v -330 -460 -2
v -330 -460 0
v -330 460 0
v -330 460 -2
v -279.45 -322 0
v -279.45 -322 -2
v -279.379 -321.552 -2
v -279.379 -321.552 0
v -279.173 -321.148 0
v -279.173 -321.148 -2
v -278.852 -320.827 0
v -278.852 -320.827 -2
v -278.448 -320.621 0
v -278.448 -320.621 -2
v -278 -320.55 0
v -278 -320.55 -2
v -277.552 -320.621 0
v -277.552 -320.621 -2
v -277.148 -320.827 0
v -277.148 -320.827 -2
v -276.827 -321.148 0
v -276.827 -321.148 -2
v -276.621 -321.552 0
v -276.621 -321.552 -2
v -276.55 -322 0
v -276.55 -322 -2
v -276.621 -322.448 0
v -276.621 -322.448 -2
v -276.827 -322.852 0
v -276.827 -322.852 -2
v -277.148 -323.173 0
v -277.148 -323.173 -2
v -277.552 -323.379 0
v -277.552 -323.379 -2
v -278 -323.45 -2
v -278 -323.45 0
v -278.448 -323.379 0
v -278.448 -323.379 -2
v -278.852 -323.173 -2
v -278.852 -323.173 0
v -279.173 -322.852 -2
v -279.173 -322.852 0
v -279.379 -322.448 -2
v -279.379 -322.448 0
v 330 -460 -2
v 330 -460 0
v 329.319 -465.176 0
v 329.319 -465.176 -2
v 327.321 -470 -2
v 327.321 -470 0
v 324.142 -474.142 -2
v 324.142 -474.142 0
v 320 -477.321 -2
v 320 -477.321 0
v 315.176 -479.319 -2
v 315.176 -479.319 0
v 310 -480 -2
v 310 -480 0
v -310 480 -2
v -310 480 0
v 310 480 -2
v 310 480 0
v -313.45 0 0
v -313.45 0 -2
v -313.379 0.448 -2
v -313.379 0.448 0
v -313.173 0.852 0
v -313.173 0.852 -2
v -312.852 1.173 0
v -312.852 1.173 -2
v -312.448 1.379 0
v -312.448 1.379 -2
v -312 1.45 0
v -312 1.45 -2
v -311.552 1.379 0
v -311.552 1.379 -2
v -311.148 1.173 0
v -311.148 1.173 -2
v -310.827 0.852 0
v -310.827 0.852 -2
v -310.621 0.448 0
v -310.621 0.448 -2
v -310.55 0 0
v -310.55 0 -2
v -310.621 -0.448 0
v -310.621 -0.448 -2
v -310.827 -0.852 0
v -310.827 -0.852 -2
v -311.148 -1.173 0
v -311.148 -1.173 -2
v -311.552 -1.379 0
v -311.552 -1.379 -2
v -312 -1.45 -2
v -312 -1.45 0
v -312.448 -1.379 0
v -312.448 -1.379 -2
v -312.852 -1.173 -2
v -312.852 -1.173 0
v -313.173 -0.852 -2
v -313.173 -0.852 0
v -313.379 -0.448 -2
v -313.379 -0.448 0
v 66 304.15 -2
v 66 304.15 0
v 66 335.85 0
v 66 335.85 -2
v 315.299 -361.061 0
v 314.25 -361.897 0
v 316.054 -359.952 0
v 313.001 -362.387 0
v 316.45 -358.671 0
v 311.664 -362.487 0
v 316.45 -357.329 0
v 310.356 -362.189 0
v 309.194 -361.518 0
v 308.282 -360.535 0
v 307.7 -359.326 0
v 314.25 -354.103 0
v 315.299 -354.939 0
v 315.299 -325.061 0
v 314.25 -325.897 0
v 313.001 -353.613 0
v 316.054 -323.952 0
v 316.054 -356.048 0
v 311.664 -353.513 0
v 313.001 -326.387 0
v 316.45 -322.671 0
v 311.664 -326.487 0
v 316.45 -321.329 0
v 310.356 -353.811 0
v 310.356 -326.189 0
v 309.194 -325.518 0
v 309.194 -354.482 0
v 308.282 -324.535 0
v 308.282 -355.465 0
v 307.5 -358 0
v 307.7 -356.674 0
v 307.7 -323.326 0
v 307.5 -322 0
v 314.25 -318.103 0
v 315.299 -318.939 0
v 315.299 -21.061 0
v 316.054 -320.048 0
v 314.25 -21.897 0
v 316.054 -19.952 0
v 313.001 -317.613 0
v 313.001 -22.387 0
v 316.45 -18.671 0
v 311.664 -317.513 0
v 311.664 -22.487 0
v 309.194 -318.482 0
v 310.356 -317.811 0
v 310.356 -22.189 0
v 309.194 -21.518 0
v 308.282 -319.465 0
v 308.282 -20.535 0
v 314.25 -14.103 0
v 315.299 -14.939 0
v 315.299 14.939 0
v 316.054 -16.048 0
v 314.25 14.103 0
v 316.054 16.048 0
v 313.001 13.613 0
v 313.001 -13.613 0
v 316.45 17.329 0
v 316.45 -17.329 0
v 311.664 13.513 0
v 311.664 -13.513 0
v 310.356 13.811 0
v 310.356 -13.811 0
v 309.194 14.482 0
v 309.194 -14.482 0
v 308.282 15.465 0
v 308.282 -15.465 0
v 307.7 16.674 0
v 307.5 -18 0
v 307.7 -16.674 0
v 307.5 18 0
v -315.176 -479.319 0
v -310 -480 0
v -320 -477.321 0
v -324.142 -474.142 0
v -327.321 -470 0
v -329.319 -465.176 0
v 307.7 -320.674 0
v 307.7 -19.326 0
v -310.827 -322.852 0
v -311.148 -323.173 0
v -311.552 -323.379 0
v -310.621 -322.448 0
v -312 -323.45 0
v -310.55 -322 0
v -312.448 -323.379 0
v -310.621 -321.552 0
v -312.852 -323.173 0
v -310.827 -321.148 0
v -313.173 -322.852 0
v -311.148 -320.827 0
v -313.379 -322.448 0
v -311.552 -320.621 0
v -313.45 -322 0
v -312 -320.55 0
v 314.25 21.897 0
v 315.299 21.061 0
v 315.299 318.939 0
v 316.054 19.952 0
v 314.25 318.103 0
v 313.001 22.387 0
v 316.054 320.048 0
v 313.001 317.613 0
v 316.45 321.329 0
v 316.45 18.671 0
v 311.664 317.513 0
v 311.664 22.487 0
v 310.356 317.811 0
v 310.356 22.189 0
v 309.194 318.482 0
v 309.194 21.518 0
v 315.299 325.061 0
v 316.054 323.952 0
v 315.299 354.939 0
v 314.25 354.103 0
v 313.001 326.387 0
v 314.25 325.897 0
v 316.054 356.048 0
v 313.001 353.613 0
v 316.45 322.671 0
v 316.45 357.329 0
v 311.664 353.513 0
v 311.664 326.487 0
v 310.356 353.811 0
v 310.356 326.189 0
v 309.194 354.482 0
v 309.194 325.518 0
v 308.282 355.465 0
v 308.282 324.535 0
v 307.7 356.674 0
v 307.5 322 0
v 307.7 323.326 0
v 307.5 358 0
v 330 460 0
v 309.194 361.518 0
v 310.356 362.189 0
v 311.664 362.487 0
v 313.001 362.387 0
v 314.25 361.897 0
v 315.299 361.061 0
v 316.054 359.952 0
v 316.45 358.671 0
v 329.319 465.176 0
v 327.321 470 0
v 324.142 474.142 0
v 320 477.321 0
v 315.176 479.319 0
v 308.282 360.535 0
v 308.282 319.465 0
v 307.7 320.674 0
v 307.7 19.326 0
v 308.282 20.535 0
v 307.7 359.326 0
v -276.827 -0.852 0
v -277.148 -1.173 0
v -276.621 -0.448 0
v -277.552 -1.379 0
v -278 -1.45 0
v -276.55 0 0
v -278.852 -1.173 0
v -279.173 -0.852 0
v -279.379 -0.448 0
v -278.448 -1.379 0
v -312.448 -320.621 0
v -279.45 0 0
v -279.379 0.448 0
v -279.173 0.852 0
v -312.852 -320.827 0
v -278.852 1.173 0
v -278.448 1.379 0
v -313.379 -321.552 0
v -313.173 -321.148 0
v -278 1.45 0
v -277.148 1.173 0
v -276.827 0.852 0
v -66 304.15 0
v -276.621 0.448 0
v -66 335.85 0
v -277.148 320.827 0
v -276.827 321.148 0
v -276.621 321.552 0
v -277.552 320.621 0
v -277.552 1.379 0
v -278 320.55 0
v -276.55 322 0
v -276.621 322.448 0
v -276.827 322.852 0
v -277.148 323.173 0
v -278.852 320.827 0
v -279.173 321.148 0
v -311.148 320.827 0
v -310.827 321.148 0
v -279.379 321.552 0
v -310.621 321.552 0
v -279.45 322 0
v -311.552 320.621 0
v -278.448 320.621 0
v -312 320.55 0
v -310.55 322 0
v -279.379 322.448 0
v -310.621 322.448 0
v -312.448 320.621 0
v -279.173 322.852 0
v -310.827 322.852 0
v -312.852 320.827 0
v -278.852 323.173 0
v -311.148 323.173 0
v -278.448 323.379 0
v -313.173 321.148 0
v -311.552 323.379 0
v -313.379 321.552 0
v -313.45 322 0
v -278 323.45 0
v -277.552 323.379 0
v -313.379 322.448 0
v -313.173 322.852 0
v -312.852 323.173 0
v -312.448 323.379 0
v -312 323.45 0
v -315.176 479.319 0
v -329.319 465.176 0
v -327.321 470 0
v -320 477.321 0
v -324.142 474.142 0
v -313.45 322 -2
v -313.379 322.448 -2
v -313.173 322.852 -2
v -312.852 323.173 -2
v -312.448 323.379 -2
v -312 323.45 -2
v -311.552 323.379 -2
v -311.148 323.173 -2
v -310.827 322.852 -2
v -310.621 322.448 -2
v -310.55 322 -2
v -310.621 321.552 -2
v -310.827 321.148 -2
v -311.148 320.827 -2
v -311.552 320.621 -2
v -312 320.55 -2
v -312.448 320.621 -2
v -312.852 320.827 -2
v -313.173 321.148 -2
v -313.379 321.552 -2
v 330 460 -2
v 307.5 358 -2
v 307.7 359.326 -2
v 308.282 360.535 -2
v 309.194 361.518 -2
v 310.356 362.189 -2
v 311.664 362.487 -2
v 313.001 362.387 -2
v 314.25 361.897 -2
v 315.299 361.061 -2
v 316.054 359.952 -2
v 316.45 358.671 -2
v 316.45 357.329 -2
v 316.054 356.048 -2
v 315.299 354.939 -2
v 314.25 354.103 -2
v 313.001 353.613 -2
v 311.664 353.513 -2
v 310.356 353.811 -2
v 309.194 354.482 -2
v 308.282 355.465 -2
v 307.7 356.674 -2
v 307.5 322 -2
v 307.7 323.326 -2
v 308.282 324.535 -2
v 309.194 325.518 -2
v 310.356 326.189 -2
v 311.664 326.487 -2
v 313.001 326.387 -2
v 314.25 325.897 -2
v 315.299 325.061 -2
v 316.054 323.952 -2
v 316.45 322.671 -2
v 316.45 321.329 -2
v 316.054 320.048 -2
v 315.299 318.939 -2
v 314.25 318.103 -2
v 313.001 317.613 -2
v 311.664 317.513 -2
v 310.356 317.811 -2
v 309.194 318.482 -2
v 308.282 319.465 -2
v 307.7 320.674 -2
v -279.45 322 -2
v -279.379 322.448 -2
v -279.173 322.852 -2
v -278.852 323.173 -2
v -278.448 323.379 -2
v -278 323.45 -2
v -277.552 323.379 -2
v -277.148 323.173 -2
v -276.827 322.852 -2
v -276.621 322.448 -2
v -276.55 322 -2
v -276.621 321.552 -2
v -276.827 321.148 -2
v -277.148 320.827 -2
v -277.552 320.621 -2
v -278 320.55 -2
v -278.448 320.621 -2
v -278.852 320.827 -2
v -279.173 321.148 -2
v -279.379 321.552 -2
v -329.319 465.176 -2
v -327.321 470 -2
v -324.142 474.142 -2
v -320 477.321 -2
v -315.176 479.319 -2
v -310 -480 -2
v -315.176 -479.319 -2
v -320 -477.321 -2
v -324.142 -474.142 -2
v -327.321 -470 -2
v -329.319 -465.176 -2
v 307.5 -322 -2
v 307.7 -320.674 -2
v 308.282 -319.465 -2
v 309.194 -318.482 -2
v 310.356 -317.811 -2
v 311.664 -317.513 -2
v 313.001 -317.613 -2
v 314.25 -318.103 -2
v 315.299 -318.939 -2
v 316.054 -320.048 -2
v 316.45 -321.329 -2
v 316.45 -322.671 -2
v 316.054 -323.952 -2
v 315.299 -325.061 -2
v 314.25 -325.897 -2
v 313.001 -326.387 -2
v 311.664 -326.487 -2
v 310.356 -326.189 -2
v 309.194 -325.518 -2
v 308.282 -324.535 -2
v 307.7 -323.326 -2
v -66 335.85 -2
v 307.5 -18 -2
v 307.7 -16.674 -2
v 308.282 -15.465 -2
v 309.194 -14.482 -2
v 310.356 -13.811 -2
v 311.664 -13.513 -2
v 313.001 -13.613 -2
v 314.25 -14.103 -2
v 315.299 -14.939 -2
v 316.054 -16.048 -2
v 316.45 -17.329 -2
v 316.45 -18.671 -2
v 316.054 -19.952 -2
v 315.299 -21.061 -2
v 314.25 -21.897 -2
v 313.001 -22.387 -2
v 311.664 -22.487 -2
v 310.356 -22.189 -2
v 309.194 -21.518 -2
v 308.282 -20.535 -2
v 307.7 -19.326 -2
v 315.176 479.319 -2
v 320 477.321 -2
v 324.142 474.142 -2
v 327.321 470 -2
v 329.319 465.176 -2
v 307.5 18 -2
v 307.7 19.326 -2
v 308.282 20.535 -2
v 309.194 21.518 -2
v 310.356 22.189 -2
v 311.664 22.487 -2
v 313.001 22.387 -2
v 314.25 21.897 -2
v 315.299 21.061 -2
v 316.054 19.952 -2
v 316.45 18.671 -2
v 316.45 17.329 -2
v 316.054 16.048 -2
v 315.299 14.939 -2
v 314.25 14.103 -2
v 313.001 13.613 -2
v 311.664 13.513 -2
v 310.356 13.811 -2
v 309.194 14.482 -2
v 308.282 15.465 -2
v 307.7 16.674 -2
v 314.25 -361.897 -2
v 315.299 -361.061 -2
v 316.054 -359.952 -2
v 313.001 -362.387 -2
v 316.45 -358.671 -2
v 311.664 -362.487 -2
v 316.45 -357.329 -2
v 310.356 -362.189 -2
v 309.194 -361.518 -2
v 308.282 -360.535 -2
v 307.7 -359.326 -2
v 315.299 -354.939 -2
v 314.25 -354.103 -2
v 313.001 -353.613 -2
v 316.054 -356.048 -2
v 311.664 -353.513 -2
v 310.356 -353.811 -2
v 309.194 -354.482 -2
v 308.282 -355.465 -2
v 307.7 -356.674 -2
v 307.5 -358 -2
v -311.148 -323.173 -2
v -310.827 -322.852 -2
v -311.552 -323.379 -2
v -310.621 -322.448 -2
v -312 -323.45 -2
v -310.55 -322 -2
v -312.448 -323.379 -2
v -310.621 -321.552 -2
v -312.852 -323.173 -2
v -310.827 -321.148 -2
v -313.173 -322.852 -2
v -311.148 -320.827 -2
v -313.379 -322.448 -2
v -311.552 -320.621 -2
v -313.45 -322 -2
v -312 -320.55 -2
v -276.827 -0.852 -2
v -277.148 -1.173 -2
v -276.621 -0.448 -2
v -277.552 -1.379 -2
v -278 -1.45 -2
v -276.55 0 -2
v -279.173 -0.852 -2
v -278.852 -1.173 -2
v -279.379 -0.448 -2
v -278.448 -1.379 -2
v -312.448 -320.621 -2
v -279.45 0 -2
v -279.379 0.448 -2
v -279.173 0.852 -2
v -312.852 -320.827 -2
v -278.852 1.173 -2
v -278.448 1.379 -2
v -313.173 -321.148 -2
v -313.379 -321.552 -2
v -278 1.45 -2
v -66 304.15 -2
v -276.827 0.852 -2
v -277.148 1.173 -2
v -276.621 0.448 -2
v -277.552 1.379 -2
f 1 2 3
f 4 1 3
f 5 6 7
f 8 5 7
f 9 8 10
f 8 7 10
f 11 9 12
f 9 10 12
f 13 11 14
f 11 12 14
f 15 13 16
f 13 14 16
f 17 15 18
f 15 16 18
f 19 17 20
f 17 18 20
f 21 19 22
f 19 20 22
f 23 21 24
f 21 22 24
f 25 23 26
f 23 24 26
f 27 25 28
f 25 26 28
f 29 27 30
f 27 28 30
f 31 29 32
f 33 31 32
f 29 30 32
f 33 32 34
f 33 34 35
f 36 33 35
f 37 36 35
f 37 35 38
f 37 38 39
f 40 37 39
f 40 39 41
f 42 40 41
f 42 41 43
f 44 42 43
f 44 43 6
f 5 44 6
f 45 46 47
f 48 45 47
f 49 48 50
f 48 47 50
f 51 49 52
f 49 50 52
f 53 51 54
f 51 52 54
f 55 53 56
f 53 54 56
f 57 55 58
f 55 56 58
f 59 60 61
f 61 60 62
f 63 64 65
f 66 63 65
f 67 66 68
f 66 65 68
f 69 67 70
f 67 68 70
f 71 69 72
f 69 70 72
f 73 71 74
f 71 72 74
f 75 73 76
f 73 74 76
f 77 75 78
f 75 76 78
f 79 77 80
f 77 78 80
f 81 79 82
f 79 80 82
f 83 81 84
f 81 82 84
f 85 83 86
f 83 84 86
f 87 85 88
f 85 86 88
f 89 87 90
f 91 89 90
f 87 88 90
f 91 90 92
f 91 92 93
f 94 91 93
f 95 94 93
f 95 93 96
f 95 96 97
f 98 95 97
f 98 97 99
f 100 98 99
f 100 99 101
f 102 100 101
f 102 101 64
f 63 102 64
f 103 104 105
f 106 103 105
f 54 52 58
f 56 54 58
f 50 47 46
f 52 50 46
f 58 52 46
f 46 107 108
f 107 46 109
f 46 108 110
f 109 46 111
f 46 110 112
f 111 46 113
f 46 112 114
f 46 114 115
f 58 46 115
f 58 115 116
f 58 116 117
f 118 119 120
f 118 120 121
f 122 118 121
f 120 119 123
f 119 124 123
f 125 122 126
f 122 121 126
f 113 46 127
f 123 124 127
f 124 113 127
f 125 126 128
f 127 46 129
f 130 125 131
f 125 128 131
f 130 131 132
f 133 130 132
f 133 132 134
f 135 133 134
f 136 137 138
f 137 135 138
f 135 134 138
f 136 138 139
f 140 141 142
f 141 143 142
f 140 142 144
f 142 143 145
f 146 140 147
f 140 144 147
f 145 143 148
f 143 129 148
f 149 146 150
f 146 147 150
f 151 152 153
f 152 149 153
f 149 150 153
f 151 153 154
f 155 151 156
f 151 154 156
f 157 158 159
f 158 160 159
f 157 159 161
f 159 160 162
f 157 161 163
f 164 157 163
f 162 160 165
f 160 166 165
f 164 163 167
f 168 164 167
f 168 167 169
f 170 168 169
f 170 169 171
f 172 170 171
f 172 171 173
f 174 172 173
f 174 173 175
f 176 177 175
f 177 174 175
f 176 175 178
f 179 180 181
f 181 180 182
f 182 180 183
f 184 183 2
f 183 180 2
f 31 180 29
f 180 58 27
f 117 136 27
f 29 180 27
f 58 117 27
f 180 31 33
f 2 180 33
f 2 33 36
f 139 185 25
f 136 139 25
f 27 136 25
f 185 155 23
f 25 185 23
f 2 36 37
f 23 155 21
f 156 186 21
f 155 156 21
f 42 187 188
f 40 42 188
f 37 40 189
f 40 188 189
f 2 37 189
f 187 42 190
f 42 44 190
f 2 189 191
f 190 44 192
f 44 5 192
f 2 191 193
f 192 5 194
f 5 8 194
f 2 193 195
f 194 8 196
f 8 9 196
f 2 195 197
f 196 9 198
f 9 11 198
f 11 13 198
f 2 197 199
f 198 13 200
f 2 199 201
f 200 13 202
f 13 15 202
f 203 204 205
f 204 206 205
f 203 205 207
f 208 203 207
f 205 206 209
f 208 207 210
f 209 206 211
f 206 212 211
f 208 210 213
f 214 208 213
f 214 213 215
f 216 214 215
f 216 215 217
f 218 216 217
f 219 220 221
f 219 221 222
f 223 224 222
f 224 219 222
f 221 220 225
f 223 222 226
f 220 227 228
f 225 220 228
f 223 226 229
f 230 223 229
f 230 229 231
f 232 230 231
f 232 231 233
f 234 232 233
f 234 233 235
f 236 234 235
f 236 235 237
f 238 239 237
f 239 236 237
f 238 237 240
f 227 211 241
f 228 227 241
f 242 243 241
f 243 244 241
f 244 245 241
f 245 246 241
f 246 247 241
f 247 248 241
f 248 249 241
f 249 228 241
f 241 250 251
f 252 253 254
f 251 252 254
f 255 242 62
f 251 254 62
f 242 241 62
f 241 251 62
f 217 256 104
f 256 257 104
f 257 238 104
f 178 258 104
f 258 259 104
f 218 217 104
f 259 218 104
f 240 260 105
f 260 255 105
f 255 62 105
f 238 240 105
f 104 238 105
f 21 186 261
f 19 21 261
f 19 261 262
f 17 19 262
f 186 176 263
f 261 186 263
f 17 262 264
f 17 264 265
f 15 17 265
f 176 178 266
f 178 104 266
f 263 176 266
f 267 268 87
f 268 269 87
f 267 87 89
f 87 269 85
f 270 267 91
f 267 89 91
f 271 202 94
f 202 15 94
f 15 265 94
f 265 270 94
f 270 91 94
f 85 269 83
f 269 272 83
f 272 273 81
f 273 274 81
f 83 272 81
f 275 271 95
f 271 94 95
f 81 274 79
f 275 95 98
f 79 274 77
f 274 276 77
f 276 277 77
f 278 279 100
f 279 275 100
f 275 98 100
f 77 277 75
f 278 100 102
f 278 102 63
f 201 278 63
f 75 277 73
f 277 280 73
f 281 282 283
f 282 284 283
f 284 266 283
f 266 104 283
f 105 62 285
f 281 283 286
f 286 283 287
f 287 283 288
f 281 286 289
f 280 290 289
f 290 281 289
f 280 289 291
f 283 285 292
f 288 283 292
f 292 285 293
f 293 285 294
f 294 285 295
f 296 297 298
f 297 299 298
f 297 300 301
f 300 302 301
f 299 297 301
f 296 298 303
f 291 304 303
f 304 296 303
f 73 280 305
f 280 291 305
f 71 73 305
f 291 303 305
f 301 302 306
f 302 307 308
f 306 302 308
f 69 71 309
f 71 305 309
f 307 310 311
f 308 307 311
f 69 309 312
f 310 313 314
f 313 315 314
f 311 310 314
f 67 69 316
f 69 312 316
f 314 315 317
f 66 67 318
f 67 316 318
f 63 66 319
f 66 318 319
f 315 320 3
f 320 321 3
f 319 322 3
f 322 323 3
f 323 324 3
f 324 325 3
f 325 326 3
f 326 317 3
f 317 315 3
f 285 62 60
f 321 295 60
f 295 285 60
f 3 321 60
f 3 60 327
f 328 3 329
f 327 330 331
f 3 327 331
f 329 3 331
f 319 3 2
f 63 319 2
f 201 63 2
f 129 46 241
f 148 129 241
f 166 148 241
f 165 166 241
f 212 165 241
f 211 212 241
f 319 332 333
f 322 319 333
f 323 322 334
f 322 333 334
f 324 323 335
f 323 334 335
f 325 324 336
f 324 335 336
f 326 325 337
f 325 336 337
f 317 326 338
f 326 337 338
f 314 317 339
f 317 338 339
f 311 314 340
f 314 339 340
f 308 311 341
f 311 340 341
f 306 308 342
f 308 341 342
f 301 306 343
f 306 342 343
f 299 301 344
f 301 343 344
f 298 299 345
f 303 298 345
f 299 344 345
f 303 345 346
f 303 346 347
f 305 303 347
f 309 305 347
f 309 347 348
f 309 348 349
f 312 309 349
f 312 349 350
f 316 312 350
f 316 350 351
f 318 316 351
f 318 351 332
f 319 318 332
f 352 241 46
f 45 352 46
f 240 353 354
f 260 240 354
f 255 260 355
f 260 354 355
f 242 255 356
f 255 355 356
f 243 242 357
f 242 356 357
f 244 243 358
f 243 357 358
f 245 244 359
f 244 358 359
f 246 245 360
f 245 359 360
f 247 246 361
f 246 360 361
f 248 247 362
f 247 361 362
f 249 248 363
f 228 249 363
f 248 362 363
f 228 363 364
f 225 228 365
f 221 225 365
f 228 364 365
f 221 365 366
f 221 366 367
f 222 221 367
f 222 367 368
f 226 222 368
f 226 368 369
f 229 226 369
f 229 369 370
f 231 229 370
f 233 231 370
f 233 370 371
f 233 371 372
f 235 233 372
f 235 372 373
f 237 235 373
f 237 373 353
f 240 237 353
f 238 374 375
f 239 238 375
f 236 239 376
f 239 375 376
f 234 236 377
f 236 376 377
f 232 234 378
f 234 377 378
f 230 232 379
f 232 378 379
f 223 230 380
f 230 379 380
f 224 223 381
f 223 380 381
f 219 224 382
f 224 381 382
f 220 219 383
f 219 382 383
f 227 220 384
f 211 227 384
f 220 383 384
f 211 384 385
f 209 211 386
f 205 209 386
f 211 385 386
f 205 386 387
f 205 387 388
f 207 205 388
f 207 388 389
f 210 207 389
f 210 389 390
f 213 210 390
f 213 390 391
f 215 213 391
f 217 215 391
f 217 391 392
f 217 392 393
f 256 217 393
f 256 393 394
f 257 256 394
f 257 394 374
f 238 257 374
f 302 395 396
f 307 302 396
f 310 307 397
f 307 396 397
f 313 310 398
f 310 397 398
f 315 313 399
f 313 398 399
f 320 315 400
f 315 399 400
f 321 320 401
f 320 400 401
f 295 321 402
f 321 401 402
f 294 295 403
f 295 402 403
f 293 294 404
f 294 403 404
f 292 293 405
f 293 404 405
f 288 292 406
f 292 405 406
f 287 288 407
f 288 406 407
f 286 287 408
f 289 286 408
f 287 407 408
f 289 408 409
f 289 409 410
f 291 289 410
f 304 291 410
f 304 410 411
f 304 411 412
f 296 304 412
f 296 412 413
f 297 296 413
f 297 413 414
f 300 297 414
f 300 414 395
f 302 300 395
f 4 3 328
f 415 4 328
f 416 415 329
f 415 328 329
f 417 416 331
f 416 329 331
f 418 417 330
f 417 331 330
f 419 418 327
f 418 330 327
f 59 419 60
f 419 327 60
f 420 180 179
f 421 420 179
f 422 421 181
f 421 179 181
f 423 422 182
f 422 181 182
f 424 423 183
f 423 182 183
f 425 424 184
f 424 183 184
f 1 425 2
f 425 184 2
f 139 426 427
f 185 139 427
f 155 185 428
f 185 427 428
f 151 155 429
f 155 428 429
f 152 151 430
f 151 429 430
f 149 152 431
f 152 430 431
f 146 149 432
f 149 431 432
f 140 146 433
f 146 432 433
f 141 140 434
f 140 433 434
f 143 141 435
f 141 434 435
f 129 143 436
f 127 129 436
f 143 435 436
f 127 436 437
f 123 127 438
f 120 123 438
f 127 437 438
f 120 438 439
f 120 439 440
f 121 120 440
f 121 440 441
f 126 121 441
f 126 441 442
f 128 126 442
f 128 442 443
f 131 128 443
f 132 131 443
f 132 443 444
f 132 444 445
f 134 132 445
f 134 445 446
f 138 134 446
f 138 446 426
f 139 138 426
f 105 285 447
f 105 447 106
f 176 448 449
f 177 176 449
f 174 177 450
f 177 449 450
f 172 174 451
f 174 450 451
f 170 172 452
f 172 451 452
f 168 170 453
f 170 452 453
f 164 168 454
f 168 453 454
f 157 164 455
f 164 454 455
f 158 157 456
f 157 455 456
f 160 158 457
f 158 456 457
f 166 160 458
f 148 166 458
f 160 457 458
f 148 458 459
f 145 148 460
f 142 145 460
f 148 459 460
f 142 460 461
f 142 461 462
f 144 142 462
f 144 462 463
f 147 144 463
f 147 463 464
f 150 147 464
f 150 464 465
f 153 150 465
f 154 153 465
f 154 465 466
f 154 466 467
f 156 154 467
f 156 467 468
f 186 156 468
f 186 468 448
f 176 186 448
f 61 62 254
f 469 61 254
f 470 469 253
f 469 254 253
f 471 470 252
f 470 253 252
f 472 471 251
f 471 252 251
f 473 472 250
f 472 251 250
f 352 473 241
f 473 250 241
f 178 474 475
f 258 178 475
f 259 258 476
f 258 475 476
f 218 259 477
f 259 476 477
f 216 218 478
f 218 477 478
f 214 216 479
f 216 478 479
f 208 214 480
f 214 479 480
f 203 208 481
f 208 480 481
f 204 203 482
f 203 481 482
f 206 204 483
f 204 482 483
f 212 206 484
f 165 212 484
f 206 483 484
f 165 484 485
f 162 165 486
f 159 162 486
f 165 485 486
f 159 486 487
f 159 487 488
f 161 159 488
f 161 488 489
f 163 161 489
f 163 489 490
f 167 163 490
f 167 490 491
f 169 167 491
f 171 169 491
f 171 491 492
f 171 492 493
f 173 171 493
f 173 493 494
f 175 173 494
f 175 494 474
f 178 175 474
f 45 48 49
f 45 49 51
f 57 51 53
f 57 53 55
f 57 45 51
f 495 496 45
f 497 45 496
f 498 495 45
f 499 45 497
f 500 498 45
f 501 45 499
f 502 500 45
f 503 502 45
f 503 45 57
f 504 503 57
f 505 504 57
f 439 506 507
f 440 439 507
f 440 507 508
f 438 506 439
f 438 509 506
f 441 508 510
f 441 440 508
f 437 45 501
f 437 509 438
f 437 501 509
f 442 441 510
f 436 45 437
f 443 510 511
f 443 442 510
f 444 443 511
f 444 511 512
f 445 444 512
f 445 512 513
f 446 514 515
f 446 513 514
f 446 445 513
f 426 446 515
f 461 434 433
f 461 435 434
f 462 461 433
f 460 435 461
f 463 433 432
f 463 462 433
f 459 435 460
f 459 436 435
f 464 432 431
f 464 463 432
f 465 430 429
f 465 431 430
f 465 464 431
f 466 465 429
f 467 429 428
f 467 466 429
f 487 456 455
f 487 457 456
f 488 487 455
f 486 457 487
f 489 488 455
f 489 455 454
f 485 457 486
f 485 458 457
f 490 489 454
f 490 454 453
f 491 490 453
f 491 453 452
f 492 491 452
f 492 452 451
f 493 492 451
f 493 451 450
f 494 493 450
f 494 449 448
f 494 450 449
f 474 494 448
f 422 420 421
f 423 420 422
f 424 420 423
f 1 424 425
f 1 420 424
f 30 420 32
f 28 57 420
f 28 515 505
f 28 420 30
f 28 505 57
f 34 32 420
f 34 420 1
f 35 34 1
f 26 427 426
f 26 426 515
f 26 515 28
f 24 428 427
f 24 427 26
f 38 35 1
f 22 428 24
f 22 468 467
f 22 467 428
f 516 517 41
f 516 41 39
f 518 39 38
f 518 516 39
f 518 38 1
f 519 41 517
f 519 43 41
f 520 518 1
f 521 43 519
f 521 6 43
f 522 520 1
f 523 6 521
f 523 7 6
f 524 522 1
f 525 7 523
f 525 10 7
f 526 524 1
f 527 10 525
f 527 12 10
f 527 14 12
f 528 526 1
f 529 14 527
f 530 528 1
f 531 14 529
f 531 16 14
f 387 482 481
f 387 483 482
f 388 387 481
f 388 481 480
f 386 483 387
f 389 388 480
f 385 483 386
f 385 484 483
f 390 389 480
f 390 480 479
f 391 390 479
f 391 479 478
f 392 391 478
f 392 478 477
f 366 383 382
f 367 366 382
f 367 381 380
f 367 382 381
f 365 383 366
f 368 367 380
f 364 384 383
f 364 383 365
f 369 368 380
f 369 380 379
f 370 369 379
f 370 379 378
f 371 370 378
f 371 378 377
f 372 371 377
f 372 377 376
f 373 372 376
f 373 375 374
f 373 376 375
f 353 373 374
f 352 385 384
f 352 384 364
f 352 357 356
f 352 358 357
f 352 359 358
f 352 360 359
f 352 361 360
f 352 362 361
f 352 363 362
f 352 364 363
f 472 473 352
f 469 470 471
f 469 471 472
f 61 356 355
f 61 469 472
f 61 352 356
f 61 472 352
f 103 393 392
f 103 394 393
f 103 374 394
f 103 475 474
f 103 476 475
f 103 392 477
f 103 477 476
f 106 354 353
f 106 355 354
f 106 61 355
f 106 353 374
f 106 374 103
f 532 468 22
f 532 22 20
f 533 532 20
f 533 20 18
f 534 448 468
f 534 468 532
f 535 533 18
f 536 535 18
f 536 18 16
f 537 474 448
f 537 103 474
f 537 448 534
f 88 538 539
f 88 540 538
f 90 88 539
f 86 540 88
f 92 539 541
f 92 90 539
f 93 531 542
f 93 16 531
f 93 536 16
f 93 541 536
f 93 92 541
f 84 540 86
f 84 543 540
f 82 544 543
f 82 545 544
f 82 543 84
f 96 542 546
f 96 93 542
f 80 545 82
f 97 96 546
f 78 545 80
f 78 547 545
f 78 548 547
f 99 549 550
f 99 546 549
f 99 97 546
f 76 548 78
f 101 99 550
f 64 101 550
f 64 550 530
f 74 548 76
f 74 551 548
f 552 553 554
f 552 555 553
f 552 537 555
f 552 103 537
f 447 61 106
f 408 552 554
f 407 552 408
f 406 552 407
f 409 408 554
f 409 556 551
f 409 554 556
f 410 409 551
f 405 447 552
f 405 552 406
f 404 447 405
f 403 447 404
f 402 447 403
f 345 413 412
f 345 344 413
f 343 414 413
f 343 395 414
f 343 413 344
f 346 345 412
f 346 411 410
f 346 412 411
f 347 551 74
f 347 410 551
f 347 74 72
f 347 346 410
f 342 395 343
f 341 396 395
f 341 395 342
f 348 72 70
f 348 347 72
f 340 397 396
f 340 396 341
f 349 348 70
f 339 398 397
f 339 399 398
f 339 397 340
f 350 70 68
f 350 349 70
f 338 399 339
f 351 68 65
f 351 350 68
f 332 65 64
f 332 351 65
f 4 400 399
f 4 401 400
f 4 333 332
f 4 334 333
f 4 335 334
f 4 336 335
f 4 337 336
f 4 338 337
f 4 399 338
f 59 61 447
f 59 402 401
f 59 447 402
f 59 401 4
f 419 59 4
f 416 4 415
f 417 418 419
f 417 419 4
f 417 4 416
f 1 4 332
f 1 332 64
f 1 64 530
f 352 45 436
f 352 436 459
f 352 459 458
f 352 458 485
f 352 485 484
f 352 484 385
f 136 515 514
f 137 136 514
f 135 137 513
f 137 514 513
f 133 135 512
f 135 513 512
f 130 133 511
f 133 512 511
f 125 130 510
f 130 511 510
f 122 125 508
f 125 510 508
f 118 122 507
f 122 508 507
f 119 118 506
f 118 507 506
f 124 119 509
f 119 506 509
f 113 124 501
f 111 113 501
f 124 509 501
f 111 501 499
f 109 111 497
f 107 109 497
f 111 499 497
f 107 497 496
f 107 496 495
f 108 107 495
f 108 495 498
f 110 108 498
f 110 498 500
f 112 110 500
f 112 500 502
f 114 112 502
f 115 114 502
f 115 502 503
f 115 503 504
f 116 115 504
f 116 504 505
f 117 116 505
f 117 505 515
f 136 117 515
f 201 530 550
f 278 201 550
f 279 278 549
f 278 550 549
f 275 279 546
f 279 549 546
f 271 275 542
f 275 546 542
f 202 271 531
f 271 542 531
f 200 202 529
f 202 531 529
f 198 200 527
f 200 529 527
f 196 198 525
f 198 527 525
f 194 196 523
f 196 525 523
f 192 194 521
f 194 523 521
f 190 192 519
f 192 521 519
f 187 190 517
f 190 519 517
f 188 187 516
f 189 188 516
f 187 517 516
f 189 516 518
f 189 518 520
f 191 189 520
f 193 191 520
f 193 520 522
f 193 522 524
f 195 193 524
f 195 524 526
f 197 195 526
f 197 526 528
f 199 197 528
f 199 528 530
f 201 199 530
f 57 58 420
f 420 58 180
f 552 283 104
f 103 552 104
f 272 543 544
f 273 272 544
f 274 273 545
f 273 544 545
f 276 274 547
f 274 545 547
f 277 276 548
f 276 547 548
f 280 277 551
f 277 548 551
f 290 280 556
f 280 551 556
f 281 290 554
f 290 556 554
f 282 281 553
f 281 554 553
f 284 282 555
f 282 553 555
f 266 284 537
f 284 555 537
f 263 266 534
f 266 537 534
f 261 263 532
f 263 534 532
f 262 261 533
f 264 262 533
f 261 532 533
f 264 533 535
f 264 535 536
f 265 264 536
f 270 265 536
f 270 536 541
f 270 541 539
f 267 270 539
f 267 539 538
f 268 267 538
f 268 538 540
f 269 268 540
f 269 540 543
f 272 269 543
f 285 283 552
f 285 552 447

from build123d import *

# Parameters (mm, degrees)
BASE_FLANGE1_DEPTH     = 2
M8_CLEARANCE_HOLE1_D   = 9
SKETCH8_W              = 132
SKETCH8_H              = 31.7
CUT_EXTRUDE1_DEPTH     = 10
M2_5_CLEARANCE_HOLE2_D = 2.9


# Sheet-metal steps are written as plain solids
with BuildPart() as part:
    # Sketch1 → Base-Flange1 (new body)
    with BuildSketch(Plane.XY):
        with BuildLine():
            Line((310, -480), (-310, -480))
            ThreePointArc((-310, -480), (-324.142135624, -474.142135624), (-330, -460))
            Line((-330, -460), (-330, 460))
            ThreePointArc((-330, 460), (-324.142135624, 474.142135624), (-310, 480))
            Line((-310, 480), (310, 480))
            ThreePointArc((310, 480), (324.142135624, 474.142135624), (330, 460))
            Line((330, 460), (330, -460))
            ThreePointArc((330, -460), (324.142135624, -474.142135624), (310, -480))
        make_face()
    extrude(amount=-BASE_FLANGE1_DEPTH)

    # M8 Clearance Hole1 (through all)
    with Locations(Plane.XY):
        with Locations((312, 358), (312, 322), (312, 18), (312, -18), (312, -322), (312, -358)):
            Hole(M8_CLEARANCE_HOLE1_D / 2)

    # Sketch8 → Cut-Extrude1 (cut)
    with BuildSketch(Plane.XY):
        with Locations((0, 320)):
            Rectangle(SKETCH8_W, SKETCH8_H)
    extrude(amount=-CUT_EXTRUDE1_DEPTH, mode=Mode.SUBTRACT)

    # M2.5 Clearance Hole2 (through all)
    with Locations(Plane.XY):
        with Locations((-277.999999662, -322), (-311.999999662, 322), (-277.999999662, 322), (-311.999999662, 0), (-277.999999662, 0), (-311.999999662, -322)):
            Hole(M2_5_CLEARANCE_HOLE2_D / 2)


solid = part.part
